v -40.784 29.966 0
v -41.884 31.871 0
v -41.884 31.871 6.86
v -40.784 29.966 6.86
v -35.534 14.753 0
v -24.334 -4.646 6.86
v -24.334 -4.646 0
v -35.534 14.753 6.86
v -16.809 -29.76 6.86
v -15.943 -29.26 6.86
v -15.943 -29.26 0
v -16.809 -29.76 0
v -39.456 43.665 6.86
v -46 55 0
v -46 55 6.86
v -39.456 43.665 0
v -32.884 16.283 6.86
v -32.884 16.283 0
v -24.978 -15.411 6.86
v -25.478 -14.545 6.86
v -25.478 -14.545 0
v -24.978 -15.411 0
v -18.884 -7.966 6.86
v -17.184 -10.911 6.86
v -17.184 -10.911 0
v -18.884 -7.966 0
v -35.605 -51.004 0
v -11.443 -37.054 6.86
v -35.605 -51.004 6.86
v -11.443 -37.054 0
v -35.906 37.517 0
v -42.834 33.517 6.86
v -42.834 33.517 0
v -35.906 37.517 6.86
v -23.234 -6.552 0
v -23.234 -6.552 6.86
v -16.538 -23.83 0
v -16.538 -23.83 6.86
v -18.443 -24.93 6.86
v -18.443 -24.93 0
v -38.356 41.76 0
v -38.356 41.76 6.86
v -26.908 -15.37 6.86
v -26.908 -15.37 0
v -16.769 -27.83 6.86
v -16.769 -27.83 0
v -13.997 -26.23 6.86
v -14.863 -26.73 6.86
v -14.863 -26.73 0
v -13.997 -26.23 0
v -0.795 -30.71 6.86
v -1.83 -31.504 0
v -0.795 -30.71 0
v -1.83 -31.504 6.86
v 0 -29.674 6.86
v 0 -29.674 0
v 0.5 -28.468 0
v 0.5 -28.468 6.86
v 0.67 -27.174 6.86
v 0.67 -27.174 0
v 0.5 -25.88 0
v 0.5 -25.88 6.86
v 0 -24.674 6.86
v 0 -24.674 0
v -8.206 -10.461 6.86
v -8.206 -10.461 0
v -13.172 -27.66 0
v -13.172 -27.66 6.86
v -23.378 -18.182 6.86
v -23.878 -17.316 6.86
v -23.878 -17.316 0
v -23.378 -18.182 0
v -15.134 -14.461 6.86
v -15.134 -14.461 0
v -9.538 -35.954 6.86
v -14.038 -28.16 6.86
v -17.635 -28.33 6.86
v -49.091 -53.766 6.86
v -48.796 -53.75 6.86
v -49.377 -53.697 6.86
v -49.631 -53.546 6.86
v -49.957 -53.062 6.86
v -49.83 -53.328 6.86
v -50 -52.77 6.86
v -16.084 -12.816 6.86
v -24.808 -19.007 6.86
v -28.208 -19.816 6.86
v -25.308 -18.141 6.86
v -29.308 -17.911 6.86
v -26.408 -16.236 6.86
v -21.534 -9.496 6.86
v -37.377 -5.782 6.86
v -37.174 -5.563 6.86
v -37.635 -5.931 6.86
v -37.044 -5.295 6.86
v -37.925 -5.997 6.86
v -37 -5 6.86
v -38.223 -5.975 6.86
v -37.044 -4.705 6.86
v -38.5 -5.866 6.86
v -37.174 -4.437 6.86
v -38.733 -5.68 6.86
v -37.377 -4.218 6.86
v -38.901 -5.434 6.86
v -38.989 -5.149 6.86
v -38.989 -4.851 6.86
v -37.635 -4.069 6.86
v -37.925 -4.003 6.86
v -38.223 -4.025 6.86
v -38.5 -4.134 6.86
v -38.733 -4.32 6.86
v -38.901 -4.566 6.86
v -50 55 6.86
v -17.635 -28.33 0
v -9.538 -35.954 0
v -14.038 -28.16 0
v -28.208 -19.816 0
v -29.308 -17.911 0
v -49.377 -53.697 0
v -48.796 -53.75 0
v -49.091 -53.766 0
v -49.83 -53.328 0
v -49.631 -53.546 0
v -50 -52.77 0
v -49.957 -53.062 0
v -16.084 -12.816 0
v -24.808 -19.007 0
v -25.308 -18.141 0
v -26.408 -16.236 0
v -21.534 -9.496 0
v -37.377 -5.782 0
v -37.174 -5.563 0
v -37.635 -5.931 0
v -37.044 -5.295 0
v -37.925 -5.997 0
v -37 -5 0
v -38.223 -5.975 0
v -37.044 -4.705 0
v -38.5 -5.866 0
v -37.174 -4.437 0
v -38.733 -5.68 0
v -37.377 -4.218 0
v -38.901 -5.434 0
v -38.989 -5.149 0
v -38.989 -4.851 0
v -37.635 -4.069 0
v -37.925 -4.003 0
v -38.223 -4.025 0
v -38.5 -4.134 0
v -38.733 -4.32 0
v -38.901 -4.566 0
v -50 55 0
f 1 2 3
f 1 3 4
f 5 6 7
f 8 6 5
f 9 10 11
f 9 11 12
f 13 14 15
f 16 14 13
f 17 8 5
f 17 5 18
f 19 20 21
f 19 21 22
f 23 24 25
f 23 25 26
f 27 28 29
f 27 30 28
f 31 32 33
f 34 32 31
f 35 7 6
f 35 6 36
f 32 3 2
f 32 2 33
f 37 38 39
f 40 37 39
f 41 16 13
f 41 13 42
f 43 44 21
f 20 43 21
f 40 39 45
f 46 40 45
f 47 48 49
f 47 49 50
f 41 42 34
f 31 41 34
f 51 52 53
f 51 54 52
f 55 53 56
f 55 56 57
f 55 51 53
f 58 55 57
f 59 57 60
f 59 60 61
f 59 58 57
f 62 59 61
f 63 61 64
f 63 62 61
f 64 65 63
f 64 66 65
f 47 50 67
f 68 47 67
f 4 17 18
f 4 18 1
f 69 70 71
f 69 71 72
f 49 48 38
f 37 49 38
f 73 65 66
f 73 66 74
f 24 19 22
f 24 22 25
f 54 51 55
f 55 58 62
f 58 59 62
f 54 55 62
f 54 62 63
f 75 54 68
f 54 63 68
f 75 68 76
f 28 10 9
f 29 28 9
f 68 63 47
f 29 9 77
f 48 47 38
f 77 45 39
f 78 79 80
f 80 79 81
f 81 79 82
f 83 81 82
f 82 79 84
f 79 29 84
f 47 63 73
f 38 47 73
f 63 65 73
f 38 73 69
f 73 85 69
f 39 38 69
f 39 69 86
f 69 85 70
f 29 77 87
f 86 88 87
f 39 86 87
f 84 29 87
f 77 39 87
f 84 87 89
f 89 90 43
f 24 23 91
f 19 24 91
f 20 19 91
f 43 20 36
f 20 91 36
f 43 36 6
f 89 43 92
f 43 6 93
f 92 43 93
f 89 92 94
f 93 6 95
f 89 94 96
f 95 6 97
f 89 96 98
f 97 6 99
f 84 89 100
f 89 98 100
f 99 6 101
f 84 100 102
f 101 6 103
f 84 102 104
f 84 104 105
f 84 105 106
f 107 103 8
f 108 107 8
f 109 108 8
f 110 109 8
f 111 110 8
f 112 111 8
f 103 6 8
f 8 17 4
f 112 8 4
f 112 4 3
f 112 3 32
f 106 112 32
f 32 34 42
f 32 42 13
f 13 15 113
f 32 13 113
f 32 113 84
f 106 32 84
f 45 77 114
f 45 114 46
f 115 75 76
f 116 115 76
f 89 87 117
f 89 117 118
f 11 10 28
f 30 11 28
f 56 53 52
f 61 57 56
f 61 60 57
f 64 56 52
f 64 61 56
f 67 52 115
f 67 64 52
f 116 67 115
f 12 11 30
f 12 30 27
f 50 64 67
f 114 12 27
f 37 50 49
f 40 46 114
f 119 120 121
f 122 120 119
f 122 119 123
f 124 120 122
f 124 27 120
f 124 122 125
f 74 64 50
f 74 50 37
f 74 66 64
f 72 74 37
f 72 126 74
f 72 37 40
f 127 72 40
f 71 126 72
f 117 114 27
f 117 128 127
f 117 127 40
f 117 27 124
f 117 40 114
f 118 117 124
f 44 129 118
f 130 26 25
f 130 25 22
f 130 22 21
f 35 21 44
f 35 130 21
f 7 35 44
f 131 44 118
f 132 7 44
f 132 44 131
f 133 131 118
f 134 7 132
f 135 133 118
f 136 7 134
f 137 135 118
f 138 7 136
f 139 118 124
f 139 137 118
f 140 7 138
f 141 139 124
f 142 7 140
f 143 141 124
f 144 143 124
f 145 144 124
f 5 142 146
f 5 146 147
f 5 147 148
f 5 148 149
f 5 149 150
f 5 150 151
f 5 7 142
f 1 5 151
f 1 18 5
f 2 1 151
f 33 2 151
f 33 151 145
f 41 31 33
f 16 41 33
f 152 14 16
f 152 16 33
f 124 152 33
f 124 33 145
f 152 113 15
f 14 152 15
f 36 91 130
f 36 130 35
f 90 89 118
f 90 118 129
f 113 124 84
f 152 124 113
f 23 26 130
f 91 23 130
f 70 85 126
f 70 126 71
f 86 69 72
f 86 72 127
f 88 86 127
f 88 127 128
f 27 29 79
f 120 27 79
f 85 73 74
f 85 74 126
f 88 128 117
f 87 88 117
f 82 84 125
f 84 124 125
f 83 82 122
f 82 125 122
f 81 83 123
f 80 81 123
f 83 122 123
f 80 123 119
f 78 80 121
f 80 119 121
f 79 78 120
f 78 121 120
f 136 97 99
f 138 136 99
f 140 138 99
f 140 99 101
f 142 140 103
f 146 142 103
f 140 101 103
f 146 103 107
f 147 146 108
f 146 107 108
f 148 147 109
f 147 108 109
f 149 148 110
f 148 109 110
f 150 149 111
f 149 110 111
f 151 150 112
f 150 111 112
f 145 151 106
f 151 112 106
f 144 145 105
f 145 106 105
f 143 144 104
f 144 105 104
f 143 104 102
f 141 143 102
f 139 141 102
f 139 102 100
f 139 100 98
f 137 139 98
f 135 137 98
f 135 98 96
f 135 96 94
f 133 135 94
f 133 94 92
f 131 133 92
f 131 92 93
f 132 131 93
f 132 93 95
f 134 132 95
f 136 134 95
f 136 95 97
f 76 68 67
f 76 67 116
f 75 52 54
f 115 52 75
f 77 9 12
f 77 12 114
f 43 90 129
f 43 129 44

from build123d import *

# Parameters (mm, degrees)
SKETCH1_W                = 100
SKETCH1_H                = 110
BOSS_EXTRUDE1_DEPTH      = 6.86
BOSS_EXTRUDE2_DEPTH      = 6.86
CUT_EXTRUDE1_DEPTH       = 84.419927529
CUT_EXTRUDE1_DEPTH_BACK  = 84.419927529
CUT_EXTRUDE5_DEPTH       = 84.419927529
CUT_EXTRUDE6_DEPTH       = 84.419927529
SKETCH7_W                = 42
SKETCH7_H                = 3.55
CUT_EXTRUDE7_DEPTH       = 84.419927529
SKETCH8_W                = 5
SKETCH8_H                = 7.62
CUT_EXTRUDE8_DEPTH       = 84.419927529
CUT_EXTRUDE9_DEPTH       = 84.419927529
LPATTERN1_COUNT          = 2
LPATTERN1_PITCH          = 49.4
SKETCH15_W               = 6.5
SKETCH15_H               = 9.5
BOSS_EXTRUDE3_DEPTH      = 6.86
CUT_EXTRUDE14_START      = -6.86
CUT_EXTRUDE14_DEPTH      = 6.86
BOSS_EXTRUDE4_DEPTH      = 6.86
FILLET3_R                = 5
FILLET4_R                = 7
CUT_EXTRUDE11_DEPTH      = 84.419927529
BOSS_EXTRUDE5_DEPTH      = 6.86
CUT_EXTRUDE12_DEPTH      = 84.419927529
CUT_EXTRUDE12_DEPTH_BACK = 84.419927529
SKETCH21_R               = 1
CUT_EXTRUDE13_DEPTH      = 84.419927529
CUT_EXTRUDE15_DEPTH      = 84.419927529
CUT_EXTRUDE15_DEPTH_BACK = 84.419927529
CUT_EXTRUDE16_DEPTH      = 84.419927529
CUT_EXTRUDE16_DEPTH_BACK = 84.419927529
FILLET2_R                = 1
BOSS_EXTRUDE6_DEPTH      = 6.86
CUT_EXTRUDE17_DEPTH      = 84.419927529
BOSS_EXTRUDE9_DEPTH      = 6.86


# Read off the part's stored shape, not the designer's step: Cut-Extrude14
with BuildPart() as part:
    # Sketch1 → Boss-Extrude1 (new body)
    with BuildSketch(Plane.XY):
        Rectangle(SKETCH1_W, SKETCH1_H)
    extrude(amount=BOSS_EXTRUDE1_DEPTH)

    # Sketch14 → Boss-Extrude2 (add)
    with BuildSketch(Plane.XY.offset(6.86)):
        with BuildLine():
            Line((-50, 44), (-56.9, 44))
            Line((-56.9, 44), (-57.252653961, 46))
            Line((-57.252653961, 46), (-60.252653961, 46))
            ThreePointArc((-60.252653961, 46), (-62.140394827, 27.177051725), (-56.9, 9))
            Line((-56.9, 9), (-50, 9))
            Line((-50, 9), (-50, 44))
        make_face()
    extrude(amount=-BOSS_EXTRUDE2_DEPTH)

    # Sketch9 → Cut-Extrude1 (cut, two sides: drawn at the far end of the back side and taken through both)
    with BuildSketch(Plane.XY.offset(6.86).offset(-CUT_EXTRUDE1_DEPTH_BACK)):
        Polygon((-202.691345573, 326.397371639), (-46, 55), (2.5, -29.004464167), (-49.825975731, -59.214880341), (-321.22334737, -215.906225914), (291.08659924, -349.739606366), (409.618601037, 192.563991188), align=None)
    extrude(amount=CUT_EXTRUDE1_DEPTH + CUT_EXTRUDE1_DEPTH_BACK, mode=Mode.SUBTRACT)

    # Sketch11 → Cut-Extrude5 (cut, through all)
    with BuildSketch(Plane.XY.offset(6.86)):
        Polygon((-35.90593882, 37.516573181), (-8.20593882, -10.461234188), (-15.13414205, -14.461234188), (-42.83414205, 33.516573181), align=None)
    extrude(amount=-CUT_EXTRUDE5_DEPTH, mode=Mode.SUBTRACT)

    # Sketch12 → Cut-Extrude6 (cut, through all)
    with BuildSketch(Plane.XY.offset(6.86)):
        Polygon((-18.88414205, -7.96604366), (-21.534179786, -9.49604366), (-35.534179786, 14.752667646), (-32.88414205, 16.282667646), align=None)
    extrude(amount=-CUT_EXTRUDE6_DEPTH, mode=Mode.SUBTRACT)

    # Sketch7 → Cut-Extrude7 (cut, through all)
    with BuildSketch(Plane.XY.offset(6.86)):
        with Locations((-50, -34)):
            Rectangle(SKETCH7_W, SKETCH7_H)
    extrude(amount=-CUT_EXTRUDE7_DEPTH, mode=Mode.SUBTRACT)

    # Sketch8 → Cut-Extrude8 (cut, through all)
    with BuildSketch(Plane.XY.offset(6.86)):
        with Locations((-36.5, -34)):
            Rectangle(SKETCH8_W, SKETCH8_H)
    extrude(amount=-CUT_EXTRUDE8_DEPTH, mode=Mode.SUBTRACT)

    # Sketch13 → Cut-Extrude9 (cut, through all)
    with BuildSketch(Plane.XY.offset(6.86)):
        Polygon((-41.88414205, 31.871124914), (-40.78414205, 29.965869026), (-48.578370684, 25.465869026), (-48.078370684, 24.599843622), (-49.508178626, 23.774343622), (-50.008178626, 24.640369026), (-52.908497703, 22.965869026), (-54.008497703, 24.871124914), (-51.108178626, 26.545624914), (-51.608178626, 27.411650318), (-50.178370684, 28.237150318), (-49.678370684, 27.371124914), align=None)
        Polygon((-39.45593882, 43.665353548), (-38.35593882, 41.76009766), (-46.150167454, 37.26009766), (-45.650167454, 36.394072256), (-47.079975396, 35.568572256), (-47.579975396, 36.43459766), (-50.480294473, 34.76009766), (-51.580294473, 36.665353548), (-48.679975396, 38.339853548), (-49.179975396, 39.205878952), (-47.750167454, 40.031378952), (-47.250167454, 39.165353548), align=None)
        Polygon((-18.443009001, -24.930108514), (-11.443009001, -37.054464167), (-9.537753113, -35.954464167), (-16.537753113, -23.830108514), align=None)
    cut_extrude9 = extrude(amount=-CUT_EXTRUDE9_DEPTH, mode=Mode.SUBTRACT)

    # LPattern1: Cut-Extrude9 ×2
    with Locations(*[Vector(0.4999999999999939, -0.8660254037844421, 0) * (i * LPATTERN1_PITCH) for i in range(1, LPATTERN1_COUNT)]):
        add(cut_extrude9, mode=Mode.SUBTRACT)

    # Sketch15 → Boss-Extrude3 (add)
    with BuildSketch(Plane.XY.offset(6.86)):
        with Locations((-53.25, -19.75)):
            Rectangle(SKETCH15_W, SKETCH15_H)
    extrude(amount=-BOSS_EXTRUDE3_DEPTH)

    # Cut-Extrude14 outline → Cut-Extrude14 (cut)
    with BuildSketch(Plane.XY.offset(6.86).offset(CUT_EXTRUDE14_START)):
        Polygon((-56.5, -15), (-56.5, -16.500643242), (-50, -15), align=None)
    extrude(amount=CUT_EXTRUDE14_DEPTH, mode=Mode.SUBTRACT)

    # Sketch16 → Boss-Extrude4 (add)
    with BuildSketch(Plane.XY.offset(6.86)):
        Polygon((-35.605117767, -51.004464167), (-34.105117767, -53.602540378), (-36.525588833, -55), (-42.525588833, -55), (-44.558274136, -51.479285778), align=None)
    extrude(amount=-BOSS_EXTRUDE4_DEPTH)

    # Fillet3
    fillet3_edges = [part.edges().sort_by_distance(p)[0] for p in [
        (2.5, -29.004464167, 3.43),
    ]]
    fillet(fillet3_edges, radius=FILLET3_R)

    # Fillet4
    fillet4_edges = [part.edges().sort_by_distance(p)[0] for p in [
        (-56.9, 9, 3.43),
    ]]
    fillet(fillet4_edges, radius=FILLET4_R)

    # Sketch18 → Cut-Extrude11 (cut, through all)
    with BuildSketch(Plane.XY.offset(6.86)):
        Polygon((-17.634534405, -28.330427591), (-13.997227709, -26.230427591), (-13.171727709, -27.660235533), (-16.809034405, -29.760235533), align=None)
    extrude(amount=-CUT_EXTRUDE11_DEPTH, mode=Mode.SUBTRACT)

    # Sketch19 → Boss-Extrude5 (add)
    with BuildSketch(Plane.XY.offset(6.86)):
        Polygon((-24.334179786, -4.646301399), (-23.234179786, -6.551557287), (-25.780294473, -8.021557287), (-26.880294473, -6.116301399), align=None)
    extrude(amount=-BOSS_EXTRUDE5_DEPTH)

    # Sketch20 → Cut-Extrude12 (cut, two sides: drawn at the far end of the back side and taken through both)
    with BuildSketch(Plane.XY.offset(6.86).offset(-CUT_EXTRUDE12_DEPTH_BACK)):
        Polygon((-50, 55), (-50, 44), (-48.060403212, 55), align=None)
    extrude(amount=CUT_EXTRUDE12_DEPTH + CUT_EXTRUDE12_DEPTH_BACK, mode=Mode.SUBTRACT)

    # Sketch21 → Cut-Extrude13 (cut, through all)
    with BuildSketch(Plane.XY.offset(6.86)):
        with Locations((-38, -5)):
            Circle(SKETCH21_R)
    extrude(amount=-CUT_EXTRUDE13_DEPTH, mode=Mode.SUBTRACT)

    # Sketch23 → Cut-Extrude15 (cut, two sides: drawn at the far end of the back side and taken through both)
    with BuildSketch(Plane.XY.offset(6.86).offset(-CUT_EXTRUDE15_DEPTH_BACK)):
        Polygon((207.425051562, 16.452548282), (-35.605117767, -51.004464167), (-50, -55), (-293.030169328, -122.457012449), (-158.11614443, -608.517351106), (342.33907646, -469.607790375), align=None)
    extrude(amount=CUT_EXTRUDE15_DEPTH + CUT_EXTRUDE15_DEPTH_BACK, mode=Mode.SUBTRACT)

    # Sketch25 → Cut-Extrude16 (cut, two sides: drawn at the far end of the back side and taken through both)
    with BuildSketch(Plane(origin=(0, 0, 0), x_dir=(-1, 0, 0), z_dir=(0, 0, -1)).offset(-CUT_EXTRUDE16_DEPTH_BACK)):
        Polygon((-209.546353054, 0.01089), (35.605117767, -51.004464167), (50, -54), (295.15147082, -105.015354167), (193.120762486, -595.318295807), (-311.577061387, -490.29205164), align=None)
    extrude(amount=CUT_EXTRUDE16_DEPTH + CUT_EXTRUDE16_DEPTH_BACK, mode=Mode.SUBTRACT)

    # Fillet2
    fillet2_edges = [part.edges().sort_by_distance(p)[0] for p in [
        (-60.252653961, 46, 3.43),
        (-56.5, -24.5, 3.43),
        (-56.5, -16.500643242, 3.43),
        (-50, -54, 3.43),
    ]]
    fillet(fillet2_edges, radius=FILLET2_R)

    # Sketch26 → Boss-Extrude6 (add)
    with BuildSketch(Plane(origin=(0, 0, 0), x_dir=(-1, 0, 0), z_dir=(0, 0, -1))):
        with BuildLine():
            Line((56.5, -15), (50, -15))
            Line((50, -15), (55.724951054, -16.321709094))
            ThreePointArc((55.724951054, -16.321709094), (56.282608157, -16.673564522), (56.5, -17.296079159))
            Line((56.5, -17.296079159), (56.5, -15))
        make_face()
        Polygon((47.579975396, 36.43459766), (50, 35.037395803), (50, 37.577736987), (48.679975396, 38.339853548), (49.179975396, 39.205878952), (47.750167454, 40.031378952), (47.250167454, 39.165353548), (39.45593882, 43.665353548), (38.35593882, 41.76009766), (46.150167454, 37.26009766), (45.650167454, 36.394072256), (47.079975396, 35.568572256), align=None)
        Polygon((49.678370684, 27.371124914), (41.88414205, 31.871124914), (40.78414205, 29.965869026), (48.578370684, 25.465869026), (48.078370684, 24.599843622), (49.508178626, 23.774343622), (50, 24.62620323), (50, 27.92820323), align=None)
        with BuildLine():
            ThreePointArc((56.5, -23.5), (56.207106781, -24.207106781), (55.5, -24.5))
            Line((55.5, -24.5), (56.5, -24.5))
            Line((56.5, -24.5), (56.5, -23.5))
        make_face()
    extrude(amount=-BOSS_EXTRUDE6_DEPTH)

    # Sketch26<3> → Cut-Extrude17 (cut, through all)
    with BuildSketch(Plane(origin=(0, 0, 0), x_dir=(-1, 0, 0), z_dir=(0, 0, -1))):
        with BuildLine():
            Line((50, 35.037395803), (50, 27.92820323))
            Line((50, 27.92820323), (50.178370684, 28.237150318))
            Line((50.178370684, 28.237150318), (51.608178626, 27.411650318))
            Line((51.608178626, 27.411650318), (51.108178626, 26.545624914))
            Line((51.108178626, 26.545624914), (54.008497703, 24.871124914))
            Line((54.008497703, 24.871124914), (52.908497703, 22.965869026))
            Line((52.908497703, 22.965869026), (50.008178626, 24.640369026))
            Line((50.008178626, 24.640369026), (50, 24.62620323))
            Line((50, 24.62620323), (50, 9))
            Line((50, 9), (52.380008746, 9))
            ThreePointArc((52.380008746, 9), (56.324728806, 10.217337668), (58.897432775, 13.445947531))
            ThreePointArc((58.897432775, 13.445947531), (62.283923616, 29.230647449), (60.464218102, 45.271649399))
            ThreePointArc((60.464218102, 45.271649399), (60.105291207, 45.797386167), (59.50182182, 46))
            Line((59.50182182, 46), (57.252653961, 46))
            Line((57.252653961, 46), (56.9, 44))
            Line((56.9, 44), (50, 44))
            Line((50, 44), (50, 37.577736987))
            Line((50, 37.577736987), (51.580294473, 36.665353548))
            Line((51.580294473, 36.665353548), (50.480294473, 34.76009766))
            Line((50.480294473, 34.76009766), (50, 35.037395803))
        make_face()
        with BuildLine():
            Line((55.724951054, -16.321709094), (50, -15))
            Line((50, -15), (50, -24.5))
            Line((50, -24.5), (55.5, -24.5))
            ThreePointArc((55.5, -24.5), (56.207106781, -24.207106781), (56.5, -23.5))
            Line((56.5, -23.5), (56.5, -17.296079159))
            ThreePointArc((56.5, -17.296079159), (56.282608157, -16.673564522), (55.724951054, -16.321709094))
        make_face()
        with BuildLine():
            Line((56.5, -15), (50, -15))
            Line((50, -15), (55.724951054, -16.321709094))
            ThreePointArc((55.724951054, -16.321709094), (56.282608157, -16.673564522), (56.5, -17.296079159))
            Line((56.5, -17.296079159), (56.5, -15))
        make_face()
        with BuildLine():
            ThreePointArc((56.5, -23.5), (56.207106781, -24.207106781), (55.5, -24.5))
            Line((55.5, -24.5), (56.5, -24.5))
            Line((56.5, -24.5), (56.5, -23.5))
        make_face()
    extrude(amount=-CUT_EXTRUDE17_DEPTH, mode=Mode.SUBTRACT)

    # Sketch29 → Boss-Extrude9 (add)
    with BuildSketch(Plane(origin=(0, 0, 0), x_dir=(-1, 0, 0), z_dir=(0, 0, -1))):
        Polygon((39, -35.775), (50, -35.775), (50, -32.225), (39, -32.225), (39, -30.19), (34, -30.19), (34, -32.225), (29, -32.225), (29, -35.775), (34, -35.775), (34, -37.81), (39, -37.81), align=None)
        Polygon((50, 44), (50, 55), (48.060403212, 55), align=None)
    extrude(amount=-BOSS_EXTRUDE9_DEPTH)


solid = part.part
